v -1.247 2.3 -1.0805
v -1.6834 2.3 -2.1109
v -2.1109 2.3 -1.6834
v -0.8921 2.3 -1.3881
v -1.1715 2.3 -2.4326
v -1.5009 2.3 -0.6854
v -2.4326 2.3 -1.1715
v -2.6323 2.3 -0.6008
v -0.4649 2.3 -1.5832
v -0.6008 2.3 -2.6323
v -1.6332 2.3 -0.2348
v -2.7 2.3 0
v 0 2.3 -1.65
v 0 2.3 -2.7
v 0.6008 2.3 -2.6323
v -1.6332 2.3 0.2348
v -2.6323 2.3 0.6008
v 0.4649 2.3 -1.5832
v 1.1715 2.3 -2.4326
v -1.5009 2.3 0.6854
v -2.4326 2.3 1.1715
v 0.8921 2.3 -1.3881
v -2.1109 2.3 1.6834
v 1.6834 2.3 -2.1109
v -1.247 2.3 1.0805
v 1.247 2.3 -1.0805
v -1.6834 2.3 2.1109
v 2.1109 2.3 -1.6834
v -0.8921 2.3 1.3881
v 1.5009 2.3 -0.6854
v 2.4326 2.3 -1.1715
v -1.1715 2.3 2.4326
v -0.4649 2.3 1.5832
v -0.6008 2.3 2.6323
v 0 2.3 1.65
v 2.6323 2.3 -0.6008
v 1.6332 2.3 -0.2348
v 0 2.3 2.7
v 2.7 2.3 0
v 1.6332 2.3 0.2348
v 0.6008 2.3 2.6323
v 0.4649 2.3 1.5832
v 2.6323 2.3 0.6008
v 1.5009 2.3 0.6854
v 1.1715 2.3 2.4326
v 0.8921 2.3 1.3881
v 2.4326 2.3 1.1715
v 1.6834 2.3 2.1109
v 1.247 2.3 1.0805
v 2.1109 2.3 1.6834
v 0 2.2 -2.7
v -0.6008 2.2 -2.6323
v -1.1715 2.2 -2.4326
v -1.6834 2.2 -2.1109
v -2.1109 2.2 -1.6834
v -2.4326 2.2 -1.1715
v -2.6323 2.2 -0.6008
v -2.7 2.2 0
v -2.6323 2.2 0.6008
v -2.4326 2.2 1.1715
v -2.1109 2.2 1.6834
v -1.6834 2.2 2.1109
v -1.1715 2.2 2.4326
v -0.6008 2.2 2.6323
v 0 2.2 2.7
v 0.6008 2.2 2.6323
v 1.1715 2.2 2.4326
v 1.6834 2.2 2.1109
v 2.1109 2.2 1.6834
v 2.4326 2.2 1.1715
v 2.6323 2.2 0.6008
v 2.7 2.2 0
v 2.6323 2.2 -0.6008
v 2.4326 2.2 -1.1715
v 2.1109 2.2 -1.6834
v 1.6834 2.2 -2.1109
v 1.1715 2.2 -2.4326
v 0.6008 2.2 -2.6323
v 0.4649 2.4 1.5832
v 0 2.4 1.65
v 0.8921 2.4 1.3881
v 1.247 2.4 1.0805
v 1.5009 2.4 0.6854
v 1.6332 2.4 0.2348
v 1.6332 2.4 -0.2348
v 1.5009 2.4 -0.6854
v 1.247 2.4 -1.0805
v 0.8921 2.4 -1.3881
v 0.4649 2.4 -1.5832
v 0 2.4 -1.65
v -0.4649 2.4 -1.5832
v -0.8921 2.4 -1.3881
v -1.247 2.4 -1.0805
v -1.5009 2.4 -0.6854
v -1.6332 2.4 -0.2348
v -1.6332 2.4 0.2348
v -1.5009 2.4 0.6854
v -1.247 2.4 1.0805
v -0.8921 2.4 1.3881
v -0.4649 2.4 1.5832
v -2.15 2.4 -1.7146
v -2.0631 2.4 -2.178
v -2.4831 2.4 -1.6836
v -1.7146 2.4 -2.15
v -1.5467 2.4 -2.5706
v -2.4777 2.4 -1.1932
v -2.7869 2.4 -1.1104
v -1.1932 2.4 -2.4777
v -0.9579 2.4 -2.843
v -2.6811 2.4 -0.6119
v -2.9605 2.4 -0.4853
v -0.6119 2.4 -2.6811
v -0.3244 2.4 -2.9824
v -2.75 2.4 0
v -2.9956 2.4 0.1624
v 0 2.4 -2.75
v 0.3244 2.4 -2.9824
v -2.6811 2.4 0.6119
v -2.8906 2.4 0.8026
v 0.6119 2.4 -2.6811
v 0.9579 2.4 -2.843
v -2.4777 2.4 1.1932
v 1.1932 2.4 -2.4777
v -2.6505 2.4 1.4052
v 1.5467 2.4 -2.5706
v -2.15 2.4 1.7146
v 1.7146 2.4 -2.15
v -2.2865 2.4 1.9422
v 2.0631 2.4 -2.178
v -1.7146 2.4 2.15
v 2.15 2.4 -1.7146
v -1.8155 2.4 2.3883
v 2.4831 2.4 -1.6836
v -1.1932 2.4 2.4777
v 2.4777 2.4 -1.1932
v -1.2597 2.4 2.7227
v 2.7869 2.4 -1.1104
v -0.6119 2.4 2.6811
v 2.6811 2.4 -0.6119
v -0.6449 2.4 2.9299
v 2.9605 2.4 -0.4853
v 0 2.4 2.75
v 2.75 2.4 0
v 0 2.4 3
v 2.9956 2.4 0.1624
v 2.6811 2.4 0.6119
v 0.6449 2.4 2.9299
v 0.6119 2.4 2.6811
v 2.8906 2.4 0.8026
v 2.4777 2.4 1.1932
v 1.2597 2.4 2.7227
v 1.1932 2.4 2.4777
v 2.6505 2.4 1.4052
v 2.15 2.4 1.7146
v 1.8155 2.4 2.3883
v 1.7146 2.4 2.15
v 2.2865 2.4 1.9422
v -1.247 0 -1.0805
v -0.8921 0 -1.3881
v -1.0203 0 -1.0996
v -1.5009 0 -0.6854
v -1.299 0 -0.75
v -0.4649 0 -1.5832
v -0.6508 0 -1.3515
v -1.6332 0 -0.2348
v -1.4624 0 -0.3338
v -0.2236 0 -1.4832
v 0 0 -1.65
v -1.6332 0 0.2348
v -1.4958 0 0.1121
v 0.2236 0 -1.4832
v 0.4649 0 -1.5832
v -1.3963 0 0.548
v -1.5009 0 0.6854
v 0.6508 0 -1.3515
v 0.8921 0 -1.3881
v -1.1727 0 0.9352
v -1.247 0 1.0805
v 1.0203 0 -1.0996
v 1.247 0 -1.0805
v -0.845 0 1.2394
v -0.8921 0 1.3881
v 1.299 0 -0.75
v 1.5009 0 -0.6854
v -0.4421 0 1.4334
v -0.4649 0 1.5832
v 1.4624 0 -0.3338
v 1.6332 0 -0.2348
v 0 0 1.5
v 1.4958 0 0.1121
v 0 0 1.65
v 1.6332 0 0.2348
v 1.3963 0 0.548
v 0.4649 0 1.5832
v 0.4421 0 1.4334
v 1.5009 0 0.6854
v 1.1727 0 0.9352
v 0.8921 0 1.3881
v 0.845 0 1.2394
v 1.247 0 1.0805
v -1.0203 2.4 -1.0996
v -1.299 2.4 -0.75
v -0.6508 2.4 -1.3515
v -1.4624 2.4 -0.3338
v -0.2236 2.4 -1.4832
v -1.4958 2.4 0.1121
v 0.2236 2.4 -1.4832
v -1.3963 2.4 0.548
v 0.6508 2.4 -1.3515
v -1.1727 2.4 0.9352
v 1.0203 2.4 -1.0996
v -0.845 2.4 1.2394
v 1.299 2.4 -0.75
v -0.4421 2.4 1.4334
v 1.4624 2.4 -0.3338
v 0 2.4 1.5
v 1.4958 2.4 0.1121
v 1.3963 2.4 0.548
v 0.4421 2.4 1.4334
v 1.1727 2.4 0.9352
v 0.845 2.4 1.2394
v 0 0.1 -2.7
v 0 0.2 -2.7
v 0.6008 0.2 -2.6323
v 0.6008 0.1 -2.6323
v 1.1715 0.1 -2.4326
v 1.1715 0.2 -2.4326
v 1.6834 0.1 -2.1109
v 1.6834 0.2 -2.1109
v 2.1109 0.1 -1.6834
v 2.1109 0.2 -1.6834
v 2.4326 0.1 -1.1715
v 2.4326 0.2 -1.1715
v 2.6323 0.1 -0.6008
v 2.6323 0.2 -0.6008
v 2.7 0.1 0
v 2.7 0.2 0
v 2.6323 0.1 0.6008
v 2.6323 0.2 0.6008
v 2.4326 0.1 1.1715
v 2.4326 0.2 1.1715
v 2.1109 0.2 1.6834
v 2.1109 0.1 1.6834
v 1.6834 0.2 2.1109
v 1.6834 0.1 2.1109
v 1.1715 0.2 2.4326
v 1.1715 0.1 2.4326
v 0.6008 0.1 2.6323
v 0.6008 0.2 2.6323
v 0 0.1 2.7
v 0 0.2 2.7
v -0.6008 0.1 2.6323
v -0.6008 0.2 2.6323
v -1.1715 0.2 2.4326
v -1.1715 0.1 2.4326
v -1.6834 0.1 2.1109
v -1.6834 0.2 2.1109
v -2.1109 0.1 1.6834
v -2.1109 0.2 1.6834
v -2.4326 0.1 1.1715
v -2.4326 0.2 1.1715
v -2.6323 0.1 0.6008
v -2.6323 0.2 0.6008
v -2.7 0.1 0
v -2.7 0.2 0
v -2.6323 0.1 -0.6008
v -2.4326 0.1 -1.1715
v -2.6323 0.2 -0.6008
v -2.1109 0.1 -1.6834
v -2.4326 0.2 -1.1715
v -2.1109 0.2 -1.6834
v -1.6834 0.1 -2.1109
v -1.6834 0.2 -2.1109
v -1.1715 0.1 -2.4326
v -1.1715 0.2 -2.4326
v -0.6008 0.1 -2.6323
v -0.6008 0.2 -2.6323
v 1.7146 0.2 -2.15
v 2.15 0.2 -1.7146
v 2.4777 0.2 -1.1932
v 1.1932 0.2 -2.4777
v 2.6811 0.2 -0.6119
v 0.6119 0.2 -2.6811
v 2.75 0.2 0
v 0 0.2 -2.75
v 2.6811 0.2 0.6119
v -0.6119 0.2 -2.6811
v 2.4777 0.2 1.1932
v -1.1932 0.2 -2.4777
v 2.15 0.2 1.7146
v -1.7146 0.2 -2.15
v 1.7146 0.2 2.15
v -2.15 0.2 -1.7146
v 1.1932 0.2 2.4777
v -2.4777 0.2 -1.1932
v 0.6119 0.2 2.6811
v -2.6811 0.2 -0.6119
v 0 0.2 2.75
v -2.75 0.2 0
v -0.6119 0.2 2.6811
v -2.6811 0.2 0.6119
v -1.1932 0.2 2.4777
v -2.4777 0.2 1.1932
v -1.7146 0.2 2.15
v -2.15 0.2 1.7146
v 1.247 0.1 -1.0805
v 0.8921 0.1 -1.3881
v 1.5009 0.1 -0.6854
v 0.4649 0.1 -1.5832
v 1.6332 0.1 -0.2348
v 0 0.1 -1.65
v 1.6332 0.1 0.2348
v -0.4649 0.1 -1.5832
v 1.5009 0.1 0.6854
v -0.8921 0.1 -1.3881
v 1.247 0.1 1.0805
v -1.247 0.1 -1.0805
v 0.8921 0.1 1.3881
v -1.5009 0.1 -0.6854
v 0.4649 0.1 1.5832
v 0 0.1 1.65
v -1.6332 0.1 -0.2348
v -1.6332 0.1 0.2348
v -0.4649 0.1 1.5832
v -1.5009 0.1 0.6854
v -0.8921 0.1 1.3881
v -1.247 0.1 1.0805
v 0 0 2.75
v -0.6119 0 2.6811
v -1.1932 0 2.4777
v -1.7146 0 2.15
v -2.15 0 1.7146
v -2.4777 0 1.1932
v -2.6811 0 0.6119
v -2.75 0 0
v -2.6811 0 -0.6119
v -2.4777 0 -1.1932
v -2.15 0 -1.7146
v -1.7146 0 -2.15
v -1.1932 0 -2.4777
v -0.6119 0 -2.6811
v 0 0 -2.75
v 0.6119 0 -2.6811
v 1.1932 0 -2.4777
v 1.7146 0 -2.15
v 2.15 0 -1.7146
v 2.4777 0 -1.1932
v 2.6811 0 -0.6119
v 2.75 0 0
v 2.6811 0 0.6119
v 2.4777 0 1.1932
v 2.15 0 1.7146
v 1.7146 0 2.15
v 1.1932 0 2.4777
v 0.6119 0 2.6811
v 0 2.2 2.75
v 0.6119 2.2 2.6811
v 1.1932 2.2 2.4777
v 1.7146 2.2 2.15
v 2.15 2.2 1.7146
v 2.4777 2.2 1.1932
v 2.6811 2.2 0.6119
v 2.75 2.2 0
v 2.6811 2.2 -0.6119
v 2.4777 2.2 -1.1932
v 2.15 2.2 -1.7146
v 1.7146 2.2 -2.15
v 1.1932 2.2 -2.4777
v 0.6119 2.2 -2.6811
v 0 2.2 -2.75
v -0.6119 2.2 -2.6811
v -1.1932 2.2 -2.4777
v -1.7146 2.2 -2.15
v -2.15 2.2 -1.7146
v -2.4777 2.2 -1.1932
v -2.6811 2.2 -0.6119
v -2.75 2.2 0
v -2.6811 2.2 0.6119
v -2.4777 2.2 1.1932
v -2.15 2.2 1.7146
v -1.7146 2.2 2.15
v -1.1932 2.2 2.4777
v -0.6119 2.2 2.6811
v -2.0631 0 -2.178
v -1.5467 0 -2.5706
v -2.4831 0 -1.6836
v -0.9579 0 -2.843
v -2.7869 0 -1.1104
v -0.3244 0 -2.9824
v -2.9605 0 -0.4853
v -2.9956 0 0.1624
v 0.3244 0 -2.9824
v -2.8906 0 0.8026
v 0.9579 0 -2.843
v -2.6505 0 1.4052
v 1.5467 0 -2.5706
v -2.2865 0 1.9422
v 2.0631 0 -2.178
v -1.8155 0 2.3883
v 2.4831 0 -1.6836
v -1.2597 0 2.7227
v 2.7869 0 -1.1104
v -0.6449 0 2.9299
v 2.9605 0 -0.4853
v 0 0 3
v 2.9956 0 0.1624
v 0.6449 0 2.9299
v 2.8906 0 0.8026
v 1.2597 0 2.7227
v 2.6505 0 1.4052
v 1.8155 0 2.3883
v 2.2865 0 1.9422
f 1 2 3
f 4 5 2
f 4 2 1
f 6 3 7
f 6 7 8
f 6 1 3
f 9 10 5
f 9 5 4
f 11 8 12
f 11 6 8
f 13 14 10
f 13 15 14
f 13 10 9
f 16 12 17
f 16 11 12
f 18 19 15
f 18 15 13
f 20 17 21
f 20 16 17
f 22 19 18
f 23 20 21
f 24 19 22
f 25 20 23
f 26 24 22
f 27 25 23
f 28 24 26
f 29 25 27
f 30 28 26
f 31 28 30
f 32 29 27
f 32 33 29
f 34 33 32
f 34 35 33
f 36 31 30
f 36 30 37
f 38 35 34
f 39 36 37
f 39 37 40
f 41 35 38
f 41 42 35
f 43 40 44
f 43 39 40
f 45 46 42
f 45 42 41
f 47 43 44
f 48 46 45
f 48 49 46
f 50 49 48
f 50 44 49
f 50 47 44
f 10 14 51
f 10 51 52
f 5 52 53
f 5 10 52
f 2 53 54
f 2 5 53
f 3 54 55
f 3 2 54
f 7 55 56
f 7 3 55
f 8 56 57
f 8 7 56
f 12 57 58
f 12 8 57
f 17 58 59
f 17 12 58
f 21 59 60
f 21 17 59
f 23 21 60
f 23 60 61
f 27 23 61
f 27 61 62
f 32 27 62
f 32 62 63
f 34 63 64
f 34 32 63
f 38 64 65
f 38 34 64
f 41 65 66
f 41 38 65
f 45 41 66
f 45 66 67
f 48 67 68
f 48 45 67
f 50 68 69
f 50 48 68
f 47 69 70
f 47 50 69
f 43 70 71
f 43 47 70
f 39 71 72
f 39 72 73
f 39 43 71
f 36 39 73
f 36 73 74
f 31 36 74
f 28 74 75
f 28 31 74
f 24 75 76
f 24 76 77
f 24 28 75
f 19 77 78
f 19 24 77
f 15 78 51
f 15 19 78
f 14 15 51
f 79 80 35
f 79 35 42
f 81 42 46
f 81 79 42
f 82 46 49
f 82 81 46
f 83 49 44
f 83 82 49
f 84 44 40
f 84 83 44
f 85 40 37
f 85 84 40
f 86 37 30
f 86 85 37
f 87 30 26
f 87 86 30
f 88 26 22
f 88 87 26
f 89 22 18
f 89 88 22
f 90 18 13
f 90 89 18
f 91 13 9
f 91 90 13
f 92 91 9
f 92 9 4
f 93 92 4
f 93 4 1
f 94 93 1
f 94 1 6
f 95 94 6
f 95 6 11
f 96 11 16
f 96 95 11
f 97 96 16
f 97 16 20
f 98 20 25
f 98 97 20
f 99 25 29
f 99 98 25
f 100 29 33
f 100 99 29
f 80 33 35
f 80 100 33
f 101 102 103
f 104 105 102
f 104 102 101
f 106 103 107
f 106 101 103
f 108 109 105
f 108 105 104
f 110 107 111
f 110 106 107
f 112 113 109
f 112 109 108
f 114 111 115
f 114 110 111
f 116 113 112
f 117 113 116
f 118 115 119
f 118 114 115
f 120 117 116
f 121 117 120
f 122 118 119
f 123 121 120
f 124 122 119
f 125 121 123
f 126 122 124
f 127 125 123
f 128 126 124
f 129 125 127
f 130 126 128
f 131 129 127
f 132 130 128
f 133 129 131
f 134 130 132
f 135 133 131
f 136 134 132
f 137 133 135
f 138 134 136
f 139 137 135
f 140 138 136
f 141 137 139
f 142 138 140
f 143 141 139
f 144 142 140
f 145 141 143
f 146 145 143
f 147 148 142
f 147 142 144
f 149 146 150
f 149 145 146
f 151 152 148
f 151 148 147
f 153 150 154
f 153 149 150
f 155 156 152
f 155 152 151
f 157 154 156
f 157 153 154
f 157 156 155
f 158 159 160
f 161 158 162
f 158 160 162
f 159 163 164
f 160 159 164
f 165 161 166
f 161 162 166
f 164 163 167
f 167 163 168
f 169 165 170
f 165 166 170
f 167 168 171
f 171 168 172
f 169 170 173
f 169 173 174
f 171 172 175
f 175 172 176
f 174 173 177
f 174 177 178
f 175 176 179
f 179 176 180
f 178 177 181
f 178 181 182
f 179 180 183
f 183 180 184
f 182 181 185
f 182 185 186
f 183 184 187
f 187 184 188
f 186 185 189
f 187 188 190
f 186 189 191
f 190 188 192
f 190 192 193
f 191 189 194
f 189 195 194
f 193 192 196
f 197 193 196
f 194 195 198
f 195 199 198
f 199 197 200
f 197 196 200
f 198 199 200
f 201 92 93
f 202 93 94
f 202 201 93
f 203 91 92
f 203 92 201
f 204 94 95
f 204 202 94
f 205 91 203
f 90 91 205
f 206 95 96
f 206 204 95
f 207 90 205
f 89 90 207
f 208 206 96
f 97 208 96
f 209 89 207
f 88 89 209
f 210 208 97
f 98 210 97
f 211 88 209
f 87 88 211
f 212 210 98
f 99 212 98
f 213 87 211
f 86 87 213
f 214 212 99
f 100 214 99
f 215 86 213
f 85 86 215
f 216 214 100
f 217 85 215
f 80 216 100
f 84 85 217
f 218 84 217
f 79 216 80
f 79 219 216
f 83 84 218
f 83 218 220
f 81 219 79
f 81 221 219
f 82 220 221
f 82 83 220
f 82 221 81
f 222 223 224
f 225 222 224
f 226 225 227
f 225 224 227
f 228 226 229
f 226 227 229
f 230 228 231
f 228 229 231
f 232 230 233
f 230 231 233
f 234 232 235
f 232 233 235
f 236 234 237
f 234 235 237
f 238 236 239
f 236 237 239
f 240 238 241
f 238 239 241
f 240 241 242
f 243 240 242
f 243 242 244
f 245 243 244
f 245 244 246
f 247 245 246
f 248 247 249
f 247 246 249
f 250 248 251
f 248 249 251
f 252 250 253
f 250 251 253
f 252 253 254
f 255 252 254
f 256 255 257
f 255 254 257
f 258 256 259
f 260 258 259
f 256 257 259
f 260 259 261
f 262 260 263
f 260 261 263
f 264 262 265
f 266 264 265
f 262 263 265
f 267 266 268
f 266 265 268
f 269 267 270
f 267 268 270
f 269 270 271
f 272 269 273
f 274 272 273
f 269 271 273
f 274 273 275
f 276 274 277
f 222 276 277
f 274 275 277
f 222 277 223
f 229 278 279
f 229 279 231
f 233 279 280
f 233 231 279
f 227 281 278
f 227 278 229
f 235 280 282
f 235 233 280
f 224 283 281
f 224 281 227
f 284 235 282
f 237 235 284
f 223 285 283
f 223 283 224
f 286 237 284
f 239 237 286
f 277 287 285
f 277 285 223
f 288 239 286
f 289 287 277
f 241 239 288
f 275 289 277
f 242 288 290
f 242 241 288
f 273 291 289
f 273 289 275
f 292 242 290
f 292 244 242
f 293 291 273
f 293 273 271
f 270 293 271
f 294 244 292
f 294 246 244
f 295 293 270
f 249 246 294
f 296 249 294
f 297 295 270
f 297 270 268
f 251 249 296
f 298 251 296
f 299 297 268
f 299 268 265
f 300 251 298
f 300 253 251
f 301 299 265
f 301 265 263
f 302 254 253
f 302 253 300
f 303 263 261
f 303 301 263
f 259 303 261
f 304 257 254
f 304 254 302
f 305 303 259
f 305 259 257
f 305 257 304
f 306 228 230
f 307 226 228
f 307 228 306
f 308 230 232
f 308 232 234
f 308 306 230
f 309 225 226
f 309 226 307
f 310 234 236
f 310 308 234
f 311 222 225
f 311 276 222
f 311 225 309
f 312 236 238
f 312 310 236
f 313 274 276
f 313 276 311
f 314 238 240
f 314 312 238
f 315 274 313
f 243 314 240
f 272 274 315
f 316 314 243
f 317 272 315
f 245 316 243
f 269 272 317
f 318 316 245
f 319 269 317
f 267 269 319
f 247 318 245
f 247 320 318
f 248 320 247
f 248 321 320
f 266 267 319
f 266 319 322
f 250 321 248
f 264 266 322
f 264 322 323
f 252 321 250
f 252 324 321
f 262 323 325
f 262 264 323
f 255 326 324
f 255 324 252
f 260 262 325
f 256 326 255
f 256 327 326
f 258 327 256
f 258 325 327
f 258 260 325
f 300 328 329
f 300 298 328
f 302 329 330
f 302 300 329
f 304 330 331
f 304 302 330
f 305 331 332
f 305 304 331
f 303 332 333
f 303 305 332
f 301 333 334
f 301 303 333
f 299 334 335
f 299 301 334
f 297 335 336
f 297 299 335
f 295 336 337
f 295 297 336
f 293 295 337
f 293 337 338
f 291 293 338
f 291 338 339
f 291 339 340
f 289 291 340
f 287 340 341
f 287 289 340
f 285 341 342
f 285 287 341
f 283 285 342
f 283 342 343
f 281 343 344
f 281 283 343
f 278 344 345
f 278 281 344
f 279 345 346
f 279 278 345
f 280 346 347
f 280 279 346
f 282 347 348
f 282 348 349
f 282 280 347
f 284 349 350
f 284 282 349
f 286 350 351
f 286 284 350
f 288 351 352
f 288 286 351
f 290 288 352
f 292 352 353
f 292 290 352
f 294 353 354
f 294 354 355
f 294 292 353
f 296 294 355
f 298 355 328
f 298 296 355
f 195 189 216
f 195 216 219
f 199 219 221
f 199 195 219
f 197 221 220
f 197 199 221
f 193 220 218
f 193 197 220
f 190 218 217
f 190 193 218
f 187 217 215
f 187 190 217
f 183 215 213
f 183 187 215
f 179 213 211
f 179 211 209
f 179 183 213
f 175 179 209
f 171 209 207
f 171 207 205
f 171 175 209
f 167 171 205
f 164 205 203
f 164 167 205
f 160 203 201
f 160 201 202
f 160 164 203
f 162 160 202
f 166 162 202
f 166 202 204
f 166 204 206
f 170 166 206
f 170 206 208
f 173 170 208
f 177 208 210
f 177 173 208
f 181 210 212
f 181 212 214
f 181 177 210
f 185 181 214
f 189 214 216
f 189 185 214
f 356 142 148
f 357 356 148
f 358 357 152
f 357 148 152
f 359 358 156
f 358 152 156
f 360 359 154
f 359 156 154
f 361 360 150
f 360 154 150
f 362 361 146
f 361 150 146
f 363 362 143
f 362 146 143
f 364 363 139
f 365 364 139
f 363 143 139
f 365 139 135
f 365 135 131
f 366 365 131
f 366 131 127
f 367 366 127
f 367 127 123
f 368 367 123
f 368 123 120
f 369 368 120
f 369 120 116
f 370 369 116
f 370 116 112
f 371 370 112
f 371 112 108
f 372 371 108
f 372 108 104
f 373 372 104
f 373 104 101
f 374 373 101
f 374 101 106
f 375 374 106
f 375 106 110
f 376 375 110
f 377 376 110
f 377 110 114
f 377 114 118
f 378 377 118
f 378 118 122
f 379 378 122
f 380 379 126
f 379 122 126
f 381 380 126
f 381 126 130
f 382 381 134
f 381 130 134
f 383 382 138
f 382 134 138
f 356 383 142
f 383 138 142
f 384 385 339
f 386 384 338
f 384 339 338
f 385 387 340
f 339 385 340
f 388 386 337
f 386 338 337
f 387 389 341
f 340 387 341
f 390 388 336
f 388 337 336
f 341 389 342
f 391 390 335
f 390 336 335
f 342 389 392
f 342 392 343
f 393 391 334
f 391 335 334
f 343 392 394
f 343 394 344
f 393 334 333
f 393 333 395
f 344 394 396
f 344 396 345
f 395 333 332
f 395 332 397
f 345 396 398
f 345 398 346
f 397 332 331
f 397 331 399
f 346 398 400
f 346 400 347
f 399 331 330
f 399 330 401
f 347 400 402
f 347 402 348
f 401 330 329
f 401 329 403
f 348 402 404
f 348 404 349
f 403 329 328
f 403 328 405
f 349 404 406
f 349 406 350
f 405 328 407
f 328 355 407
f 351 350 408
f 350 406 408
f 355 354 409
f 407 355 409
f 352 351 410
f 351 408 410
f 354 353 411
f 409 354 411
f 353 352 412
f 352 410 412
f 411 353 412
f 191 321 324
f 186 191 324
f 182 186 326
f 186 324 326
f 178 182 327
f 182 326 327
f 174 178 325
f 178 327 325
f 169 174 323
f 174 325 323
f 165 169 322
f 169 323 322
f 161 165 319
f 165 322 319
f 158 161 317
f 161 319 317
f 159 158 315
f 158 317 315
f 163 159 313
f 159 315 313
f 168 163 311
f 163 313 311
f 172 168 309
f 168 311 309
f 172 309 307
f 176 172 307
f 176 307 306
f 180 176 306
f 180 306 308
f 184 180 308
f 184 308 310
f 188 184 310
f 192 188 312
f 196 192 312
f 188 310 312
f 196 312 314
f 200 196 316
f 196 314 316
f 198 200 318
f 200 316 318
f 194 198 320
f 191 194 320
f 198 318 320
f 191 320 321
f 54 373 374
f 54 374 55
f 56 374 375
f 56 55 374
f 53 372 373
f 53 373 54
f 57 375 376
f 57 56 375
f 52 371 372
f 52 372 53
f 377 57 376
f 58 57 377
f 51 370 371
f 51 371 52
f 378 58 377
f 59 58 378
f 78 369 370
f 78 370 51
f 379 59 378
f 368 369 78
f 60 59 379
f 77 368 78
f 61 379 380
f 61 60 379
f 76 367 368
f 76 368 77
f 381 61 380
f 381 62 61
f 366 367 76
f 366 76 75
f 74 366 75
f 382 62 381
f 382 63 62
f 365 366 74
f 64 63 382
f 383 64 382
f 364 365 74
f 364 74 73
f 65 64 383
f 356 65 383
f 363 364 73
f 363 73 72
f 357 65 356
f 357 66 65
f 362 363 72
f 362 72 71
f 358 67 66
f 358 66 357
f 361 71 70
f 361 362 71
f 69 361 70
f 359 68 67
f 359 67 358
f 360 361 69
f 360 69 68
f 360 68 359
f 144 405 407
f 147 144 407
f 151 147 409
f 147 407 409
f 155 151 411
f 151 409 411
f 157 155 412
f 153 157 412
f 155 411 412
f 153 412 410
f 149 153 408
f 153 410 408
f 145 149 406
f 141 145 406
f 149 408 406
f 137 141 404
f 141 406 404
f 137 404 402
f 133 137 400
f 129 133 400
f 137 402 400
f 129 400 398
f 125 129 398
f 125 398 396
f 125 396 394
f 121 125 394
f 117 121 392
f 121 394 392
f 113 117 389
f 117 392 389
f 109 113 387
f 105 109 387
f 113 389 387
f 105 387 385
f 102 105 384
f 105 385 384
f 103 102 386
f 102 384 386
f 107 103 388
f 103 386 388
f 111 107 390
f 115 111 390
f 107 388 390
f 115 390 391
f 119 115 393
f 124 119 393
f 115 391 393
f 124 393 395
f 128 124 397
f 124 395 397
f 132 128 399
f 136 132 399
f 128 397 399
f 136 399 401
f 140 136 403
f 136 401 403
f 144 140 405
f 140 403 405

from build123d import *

# Parameters (mm, degrees)
SKETCH_1_R          = 3
SKETCH_1_R_2        = 1.5
EXTRUDE_1_DEPTH     = 2.4
SKETCH_2_R          = 2.75
SKETCH_2_R_2        = 1.65
CUT_EXTRUDE_1_DEPTH = 0.1
CUT_EXTRUDE_START   = -0.1
SKETCH_3_R          = 2.75
SKETCH_3_R_2        = 1.65
CUT_EXTRUDE_2_DEPTH = 0.1
SKETCH_4_R          = 2.75
SKETCH_4_R_2        = 2.7
CUT_EXTRUDE_3_DEPTH = 0.1
SKETCH_5_R          = 2.75
SKETCH_5_R_2        = 2.7
CUT_EXTRUDE_4_DEPTH = 0.1


with BuildPart() as part:
    # 草图1 → 凸台-拉伸1 (new body)
    with BuildSketch(Plane(origin=(0, 0, 0), x_dir=(1, 0, 0), z_dir=(0, 1, 0))):
        with Locations(Location((0, 0, 0), (0, 0, 270))):
            Circle(SKETCH_1_R)
        with Locations(Location((0, 0, 0), (0, 0, 270))):
            Circle(SKETCH_1_R_2, mode=Mode.SUBTRACT)
    extrude(amount=EXTRUDE_1_DEPTH)

    # 草图2 → 切除-拉伸1 (cut)
    with BuildSketch(Plane(origin=(0, 2.4, 0), x_dir=(1, 0, 0), z_dir=(0, 1, 0))):
        with Locations(Location((0, 0, 0), (0, 0, 270))):
            Circle(SKETCH_2_R)
        with Locations(Location((0, 0, 0), (0, 0, 270))):
            Circle(SKETCH_2_R_2, mode=Mode.SUBTRACT)
    extrude(amount=-CUT_EXTRUDE_1_DEPTH, mode=Mode.SUBTRACT)

    # 草图3 → 切除-拉伸2 (cut)
    with BuildSketch(Plane.XZ.offset(CUT_EXTRUDE_START)):
        with Locations(Location((0, 0, 0), (0, 0, 90))):
            Circle(SKETCH_3_R)
        with Locations(Location((0, 0, 0), (0, 0, 90))):
            Circle(SKETCH_3_R_2, mode=Mode.SUBTRACT)
    extrude(amount=CUT_EXTRUDE_2_DEPTH, mode=Mode.SUBTRACT)

    # 草图4 → 切除-拉伸3 (cut)
    with BuildSketch(Plane.XZ.offset(-0.1).offset(CUT_EXTRUDE_START)):
        with Locations(Location((0, 0, 0), (0, 0, 90))):
            Circle(SKETCH_4_R)
        with Locations(Location((0, 0, 0), (0, 0, 270))):
            Circle(SKETCH_4_R_2, mode=Mode.SUBTRACT)
    extrude(amount=CUT_EXTRUDE_3_DEPTH, mode=Mode.SUBTRACT)

    # 草图5 → 切除-拉伸4 (cut)
    with BuildSketch(Plane(origin=(0, 2.3, 0), x_dir=(1, 0, 0), z_dir=(0, 1, 0))):
        with Locations(Location((0, 0, 0), (0, 0, 270))):
            Circle(SKETCH_5_R)
        with Locations(Location((0, 0, 0), (0, 0, 90))):
            Circle(SKETCH_5_R_2, mode=Mode.SUBTRACT)
    extrude(amount=-CUT_EXTRUDE_4_DEPTH, mode=Mode.SUBTRACT)


solid = part.part
